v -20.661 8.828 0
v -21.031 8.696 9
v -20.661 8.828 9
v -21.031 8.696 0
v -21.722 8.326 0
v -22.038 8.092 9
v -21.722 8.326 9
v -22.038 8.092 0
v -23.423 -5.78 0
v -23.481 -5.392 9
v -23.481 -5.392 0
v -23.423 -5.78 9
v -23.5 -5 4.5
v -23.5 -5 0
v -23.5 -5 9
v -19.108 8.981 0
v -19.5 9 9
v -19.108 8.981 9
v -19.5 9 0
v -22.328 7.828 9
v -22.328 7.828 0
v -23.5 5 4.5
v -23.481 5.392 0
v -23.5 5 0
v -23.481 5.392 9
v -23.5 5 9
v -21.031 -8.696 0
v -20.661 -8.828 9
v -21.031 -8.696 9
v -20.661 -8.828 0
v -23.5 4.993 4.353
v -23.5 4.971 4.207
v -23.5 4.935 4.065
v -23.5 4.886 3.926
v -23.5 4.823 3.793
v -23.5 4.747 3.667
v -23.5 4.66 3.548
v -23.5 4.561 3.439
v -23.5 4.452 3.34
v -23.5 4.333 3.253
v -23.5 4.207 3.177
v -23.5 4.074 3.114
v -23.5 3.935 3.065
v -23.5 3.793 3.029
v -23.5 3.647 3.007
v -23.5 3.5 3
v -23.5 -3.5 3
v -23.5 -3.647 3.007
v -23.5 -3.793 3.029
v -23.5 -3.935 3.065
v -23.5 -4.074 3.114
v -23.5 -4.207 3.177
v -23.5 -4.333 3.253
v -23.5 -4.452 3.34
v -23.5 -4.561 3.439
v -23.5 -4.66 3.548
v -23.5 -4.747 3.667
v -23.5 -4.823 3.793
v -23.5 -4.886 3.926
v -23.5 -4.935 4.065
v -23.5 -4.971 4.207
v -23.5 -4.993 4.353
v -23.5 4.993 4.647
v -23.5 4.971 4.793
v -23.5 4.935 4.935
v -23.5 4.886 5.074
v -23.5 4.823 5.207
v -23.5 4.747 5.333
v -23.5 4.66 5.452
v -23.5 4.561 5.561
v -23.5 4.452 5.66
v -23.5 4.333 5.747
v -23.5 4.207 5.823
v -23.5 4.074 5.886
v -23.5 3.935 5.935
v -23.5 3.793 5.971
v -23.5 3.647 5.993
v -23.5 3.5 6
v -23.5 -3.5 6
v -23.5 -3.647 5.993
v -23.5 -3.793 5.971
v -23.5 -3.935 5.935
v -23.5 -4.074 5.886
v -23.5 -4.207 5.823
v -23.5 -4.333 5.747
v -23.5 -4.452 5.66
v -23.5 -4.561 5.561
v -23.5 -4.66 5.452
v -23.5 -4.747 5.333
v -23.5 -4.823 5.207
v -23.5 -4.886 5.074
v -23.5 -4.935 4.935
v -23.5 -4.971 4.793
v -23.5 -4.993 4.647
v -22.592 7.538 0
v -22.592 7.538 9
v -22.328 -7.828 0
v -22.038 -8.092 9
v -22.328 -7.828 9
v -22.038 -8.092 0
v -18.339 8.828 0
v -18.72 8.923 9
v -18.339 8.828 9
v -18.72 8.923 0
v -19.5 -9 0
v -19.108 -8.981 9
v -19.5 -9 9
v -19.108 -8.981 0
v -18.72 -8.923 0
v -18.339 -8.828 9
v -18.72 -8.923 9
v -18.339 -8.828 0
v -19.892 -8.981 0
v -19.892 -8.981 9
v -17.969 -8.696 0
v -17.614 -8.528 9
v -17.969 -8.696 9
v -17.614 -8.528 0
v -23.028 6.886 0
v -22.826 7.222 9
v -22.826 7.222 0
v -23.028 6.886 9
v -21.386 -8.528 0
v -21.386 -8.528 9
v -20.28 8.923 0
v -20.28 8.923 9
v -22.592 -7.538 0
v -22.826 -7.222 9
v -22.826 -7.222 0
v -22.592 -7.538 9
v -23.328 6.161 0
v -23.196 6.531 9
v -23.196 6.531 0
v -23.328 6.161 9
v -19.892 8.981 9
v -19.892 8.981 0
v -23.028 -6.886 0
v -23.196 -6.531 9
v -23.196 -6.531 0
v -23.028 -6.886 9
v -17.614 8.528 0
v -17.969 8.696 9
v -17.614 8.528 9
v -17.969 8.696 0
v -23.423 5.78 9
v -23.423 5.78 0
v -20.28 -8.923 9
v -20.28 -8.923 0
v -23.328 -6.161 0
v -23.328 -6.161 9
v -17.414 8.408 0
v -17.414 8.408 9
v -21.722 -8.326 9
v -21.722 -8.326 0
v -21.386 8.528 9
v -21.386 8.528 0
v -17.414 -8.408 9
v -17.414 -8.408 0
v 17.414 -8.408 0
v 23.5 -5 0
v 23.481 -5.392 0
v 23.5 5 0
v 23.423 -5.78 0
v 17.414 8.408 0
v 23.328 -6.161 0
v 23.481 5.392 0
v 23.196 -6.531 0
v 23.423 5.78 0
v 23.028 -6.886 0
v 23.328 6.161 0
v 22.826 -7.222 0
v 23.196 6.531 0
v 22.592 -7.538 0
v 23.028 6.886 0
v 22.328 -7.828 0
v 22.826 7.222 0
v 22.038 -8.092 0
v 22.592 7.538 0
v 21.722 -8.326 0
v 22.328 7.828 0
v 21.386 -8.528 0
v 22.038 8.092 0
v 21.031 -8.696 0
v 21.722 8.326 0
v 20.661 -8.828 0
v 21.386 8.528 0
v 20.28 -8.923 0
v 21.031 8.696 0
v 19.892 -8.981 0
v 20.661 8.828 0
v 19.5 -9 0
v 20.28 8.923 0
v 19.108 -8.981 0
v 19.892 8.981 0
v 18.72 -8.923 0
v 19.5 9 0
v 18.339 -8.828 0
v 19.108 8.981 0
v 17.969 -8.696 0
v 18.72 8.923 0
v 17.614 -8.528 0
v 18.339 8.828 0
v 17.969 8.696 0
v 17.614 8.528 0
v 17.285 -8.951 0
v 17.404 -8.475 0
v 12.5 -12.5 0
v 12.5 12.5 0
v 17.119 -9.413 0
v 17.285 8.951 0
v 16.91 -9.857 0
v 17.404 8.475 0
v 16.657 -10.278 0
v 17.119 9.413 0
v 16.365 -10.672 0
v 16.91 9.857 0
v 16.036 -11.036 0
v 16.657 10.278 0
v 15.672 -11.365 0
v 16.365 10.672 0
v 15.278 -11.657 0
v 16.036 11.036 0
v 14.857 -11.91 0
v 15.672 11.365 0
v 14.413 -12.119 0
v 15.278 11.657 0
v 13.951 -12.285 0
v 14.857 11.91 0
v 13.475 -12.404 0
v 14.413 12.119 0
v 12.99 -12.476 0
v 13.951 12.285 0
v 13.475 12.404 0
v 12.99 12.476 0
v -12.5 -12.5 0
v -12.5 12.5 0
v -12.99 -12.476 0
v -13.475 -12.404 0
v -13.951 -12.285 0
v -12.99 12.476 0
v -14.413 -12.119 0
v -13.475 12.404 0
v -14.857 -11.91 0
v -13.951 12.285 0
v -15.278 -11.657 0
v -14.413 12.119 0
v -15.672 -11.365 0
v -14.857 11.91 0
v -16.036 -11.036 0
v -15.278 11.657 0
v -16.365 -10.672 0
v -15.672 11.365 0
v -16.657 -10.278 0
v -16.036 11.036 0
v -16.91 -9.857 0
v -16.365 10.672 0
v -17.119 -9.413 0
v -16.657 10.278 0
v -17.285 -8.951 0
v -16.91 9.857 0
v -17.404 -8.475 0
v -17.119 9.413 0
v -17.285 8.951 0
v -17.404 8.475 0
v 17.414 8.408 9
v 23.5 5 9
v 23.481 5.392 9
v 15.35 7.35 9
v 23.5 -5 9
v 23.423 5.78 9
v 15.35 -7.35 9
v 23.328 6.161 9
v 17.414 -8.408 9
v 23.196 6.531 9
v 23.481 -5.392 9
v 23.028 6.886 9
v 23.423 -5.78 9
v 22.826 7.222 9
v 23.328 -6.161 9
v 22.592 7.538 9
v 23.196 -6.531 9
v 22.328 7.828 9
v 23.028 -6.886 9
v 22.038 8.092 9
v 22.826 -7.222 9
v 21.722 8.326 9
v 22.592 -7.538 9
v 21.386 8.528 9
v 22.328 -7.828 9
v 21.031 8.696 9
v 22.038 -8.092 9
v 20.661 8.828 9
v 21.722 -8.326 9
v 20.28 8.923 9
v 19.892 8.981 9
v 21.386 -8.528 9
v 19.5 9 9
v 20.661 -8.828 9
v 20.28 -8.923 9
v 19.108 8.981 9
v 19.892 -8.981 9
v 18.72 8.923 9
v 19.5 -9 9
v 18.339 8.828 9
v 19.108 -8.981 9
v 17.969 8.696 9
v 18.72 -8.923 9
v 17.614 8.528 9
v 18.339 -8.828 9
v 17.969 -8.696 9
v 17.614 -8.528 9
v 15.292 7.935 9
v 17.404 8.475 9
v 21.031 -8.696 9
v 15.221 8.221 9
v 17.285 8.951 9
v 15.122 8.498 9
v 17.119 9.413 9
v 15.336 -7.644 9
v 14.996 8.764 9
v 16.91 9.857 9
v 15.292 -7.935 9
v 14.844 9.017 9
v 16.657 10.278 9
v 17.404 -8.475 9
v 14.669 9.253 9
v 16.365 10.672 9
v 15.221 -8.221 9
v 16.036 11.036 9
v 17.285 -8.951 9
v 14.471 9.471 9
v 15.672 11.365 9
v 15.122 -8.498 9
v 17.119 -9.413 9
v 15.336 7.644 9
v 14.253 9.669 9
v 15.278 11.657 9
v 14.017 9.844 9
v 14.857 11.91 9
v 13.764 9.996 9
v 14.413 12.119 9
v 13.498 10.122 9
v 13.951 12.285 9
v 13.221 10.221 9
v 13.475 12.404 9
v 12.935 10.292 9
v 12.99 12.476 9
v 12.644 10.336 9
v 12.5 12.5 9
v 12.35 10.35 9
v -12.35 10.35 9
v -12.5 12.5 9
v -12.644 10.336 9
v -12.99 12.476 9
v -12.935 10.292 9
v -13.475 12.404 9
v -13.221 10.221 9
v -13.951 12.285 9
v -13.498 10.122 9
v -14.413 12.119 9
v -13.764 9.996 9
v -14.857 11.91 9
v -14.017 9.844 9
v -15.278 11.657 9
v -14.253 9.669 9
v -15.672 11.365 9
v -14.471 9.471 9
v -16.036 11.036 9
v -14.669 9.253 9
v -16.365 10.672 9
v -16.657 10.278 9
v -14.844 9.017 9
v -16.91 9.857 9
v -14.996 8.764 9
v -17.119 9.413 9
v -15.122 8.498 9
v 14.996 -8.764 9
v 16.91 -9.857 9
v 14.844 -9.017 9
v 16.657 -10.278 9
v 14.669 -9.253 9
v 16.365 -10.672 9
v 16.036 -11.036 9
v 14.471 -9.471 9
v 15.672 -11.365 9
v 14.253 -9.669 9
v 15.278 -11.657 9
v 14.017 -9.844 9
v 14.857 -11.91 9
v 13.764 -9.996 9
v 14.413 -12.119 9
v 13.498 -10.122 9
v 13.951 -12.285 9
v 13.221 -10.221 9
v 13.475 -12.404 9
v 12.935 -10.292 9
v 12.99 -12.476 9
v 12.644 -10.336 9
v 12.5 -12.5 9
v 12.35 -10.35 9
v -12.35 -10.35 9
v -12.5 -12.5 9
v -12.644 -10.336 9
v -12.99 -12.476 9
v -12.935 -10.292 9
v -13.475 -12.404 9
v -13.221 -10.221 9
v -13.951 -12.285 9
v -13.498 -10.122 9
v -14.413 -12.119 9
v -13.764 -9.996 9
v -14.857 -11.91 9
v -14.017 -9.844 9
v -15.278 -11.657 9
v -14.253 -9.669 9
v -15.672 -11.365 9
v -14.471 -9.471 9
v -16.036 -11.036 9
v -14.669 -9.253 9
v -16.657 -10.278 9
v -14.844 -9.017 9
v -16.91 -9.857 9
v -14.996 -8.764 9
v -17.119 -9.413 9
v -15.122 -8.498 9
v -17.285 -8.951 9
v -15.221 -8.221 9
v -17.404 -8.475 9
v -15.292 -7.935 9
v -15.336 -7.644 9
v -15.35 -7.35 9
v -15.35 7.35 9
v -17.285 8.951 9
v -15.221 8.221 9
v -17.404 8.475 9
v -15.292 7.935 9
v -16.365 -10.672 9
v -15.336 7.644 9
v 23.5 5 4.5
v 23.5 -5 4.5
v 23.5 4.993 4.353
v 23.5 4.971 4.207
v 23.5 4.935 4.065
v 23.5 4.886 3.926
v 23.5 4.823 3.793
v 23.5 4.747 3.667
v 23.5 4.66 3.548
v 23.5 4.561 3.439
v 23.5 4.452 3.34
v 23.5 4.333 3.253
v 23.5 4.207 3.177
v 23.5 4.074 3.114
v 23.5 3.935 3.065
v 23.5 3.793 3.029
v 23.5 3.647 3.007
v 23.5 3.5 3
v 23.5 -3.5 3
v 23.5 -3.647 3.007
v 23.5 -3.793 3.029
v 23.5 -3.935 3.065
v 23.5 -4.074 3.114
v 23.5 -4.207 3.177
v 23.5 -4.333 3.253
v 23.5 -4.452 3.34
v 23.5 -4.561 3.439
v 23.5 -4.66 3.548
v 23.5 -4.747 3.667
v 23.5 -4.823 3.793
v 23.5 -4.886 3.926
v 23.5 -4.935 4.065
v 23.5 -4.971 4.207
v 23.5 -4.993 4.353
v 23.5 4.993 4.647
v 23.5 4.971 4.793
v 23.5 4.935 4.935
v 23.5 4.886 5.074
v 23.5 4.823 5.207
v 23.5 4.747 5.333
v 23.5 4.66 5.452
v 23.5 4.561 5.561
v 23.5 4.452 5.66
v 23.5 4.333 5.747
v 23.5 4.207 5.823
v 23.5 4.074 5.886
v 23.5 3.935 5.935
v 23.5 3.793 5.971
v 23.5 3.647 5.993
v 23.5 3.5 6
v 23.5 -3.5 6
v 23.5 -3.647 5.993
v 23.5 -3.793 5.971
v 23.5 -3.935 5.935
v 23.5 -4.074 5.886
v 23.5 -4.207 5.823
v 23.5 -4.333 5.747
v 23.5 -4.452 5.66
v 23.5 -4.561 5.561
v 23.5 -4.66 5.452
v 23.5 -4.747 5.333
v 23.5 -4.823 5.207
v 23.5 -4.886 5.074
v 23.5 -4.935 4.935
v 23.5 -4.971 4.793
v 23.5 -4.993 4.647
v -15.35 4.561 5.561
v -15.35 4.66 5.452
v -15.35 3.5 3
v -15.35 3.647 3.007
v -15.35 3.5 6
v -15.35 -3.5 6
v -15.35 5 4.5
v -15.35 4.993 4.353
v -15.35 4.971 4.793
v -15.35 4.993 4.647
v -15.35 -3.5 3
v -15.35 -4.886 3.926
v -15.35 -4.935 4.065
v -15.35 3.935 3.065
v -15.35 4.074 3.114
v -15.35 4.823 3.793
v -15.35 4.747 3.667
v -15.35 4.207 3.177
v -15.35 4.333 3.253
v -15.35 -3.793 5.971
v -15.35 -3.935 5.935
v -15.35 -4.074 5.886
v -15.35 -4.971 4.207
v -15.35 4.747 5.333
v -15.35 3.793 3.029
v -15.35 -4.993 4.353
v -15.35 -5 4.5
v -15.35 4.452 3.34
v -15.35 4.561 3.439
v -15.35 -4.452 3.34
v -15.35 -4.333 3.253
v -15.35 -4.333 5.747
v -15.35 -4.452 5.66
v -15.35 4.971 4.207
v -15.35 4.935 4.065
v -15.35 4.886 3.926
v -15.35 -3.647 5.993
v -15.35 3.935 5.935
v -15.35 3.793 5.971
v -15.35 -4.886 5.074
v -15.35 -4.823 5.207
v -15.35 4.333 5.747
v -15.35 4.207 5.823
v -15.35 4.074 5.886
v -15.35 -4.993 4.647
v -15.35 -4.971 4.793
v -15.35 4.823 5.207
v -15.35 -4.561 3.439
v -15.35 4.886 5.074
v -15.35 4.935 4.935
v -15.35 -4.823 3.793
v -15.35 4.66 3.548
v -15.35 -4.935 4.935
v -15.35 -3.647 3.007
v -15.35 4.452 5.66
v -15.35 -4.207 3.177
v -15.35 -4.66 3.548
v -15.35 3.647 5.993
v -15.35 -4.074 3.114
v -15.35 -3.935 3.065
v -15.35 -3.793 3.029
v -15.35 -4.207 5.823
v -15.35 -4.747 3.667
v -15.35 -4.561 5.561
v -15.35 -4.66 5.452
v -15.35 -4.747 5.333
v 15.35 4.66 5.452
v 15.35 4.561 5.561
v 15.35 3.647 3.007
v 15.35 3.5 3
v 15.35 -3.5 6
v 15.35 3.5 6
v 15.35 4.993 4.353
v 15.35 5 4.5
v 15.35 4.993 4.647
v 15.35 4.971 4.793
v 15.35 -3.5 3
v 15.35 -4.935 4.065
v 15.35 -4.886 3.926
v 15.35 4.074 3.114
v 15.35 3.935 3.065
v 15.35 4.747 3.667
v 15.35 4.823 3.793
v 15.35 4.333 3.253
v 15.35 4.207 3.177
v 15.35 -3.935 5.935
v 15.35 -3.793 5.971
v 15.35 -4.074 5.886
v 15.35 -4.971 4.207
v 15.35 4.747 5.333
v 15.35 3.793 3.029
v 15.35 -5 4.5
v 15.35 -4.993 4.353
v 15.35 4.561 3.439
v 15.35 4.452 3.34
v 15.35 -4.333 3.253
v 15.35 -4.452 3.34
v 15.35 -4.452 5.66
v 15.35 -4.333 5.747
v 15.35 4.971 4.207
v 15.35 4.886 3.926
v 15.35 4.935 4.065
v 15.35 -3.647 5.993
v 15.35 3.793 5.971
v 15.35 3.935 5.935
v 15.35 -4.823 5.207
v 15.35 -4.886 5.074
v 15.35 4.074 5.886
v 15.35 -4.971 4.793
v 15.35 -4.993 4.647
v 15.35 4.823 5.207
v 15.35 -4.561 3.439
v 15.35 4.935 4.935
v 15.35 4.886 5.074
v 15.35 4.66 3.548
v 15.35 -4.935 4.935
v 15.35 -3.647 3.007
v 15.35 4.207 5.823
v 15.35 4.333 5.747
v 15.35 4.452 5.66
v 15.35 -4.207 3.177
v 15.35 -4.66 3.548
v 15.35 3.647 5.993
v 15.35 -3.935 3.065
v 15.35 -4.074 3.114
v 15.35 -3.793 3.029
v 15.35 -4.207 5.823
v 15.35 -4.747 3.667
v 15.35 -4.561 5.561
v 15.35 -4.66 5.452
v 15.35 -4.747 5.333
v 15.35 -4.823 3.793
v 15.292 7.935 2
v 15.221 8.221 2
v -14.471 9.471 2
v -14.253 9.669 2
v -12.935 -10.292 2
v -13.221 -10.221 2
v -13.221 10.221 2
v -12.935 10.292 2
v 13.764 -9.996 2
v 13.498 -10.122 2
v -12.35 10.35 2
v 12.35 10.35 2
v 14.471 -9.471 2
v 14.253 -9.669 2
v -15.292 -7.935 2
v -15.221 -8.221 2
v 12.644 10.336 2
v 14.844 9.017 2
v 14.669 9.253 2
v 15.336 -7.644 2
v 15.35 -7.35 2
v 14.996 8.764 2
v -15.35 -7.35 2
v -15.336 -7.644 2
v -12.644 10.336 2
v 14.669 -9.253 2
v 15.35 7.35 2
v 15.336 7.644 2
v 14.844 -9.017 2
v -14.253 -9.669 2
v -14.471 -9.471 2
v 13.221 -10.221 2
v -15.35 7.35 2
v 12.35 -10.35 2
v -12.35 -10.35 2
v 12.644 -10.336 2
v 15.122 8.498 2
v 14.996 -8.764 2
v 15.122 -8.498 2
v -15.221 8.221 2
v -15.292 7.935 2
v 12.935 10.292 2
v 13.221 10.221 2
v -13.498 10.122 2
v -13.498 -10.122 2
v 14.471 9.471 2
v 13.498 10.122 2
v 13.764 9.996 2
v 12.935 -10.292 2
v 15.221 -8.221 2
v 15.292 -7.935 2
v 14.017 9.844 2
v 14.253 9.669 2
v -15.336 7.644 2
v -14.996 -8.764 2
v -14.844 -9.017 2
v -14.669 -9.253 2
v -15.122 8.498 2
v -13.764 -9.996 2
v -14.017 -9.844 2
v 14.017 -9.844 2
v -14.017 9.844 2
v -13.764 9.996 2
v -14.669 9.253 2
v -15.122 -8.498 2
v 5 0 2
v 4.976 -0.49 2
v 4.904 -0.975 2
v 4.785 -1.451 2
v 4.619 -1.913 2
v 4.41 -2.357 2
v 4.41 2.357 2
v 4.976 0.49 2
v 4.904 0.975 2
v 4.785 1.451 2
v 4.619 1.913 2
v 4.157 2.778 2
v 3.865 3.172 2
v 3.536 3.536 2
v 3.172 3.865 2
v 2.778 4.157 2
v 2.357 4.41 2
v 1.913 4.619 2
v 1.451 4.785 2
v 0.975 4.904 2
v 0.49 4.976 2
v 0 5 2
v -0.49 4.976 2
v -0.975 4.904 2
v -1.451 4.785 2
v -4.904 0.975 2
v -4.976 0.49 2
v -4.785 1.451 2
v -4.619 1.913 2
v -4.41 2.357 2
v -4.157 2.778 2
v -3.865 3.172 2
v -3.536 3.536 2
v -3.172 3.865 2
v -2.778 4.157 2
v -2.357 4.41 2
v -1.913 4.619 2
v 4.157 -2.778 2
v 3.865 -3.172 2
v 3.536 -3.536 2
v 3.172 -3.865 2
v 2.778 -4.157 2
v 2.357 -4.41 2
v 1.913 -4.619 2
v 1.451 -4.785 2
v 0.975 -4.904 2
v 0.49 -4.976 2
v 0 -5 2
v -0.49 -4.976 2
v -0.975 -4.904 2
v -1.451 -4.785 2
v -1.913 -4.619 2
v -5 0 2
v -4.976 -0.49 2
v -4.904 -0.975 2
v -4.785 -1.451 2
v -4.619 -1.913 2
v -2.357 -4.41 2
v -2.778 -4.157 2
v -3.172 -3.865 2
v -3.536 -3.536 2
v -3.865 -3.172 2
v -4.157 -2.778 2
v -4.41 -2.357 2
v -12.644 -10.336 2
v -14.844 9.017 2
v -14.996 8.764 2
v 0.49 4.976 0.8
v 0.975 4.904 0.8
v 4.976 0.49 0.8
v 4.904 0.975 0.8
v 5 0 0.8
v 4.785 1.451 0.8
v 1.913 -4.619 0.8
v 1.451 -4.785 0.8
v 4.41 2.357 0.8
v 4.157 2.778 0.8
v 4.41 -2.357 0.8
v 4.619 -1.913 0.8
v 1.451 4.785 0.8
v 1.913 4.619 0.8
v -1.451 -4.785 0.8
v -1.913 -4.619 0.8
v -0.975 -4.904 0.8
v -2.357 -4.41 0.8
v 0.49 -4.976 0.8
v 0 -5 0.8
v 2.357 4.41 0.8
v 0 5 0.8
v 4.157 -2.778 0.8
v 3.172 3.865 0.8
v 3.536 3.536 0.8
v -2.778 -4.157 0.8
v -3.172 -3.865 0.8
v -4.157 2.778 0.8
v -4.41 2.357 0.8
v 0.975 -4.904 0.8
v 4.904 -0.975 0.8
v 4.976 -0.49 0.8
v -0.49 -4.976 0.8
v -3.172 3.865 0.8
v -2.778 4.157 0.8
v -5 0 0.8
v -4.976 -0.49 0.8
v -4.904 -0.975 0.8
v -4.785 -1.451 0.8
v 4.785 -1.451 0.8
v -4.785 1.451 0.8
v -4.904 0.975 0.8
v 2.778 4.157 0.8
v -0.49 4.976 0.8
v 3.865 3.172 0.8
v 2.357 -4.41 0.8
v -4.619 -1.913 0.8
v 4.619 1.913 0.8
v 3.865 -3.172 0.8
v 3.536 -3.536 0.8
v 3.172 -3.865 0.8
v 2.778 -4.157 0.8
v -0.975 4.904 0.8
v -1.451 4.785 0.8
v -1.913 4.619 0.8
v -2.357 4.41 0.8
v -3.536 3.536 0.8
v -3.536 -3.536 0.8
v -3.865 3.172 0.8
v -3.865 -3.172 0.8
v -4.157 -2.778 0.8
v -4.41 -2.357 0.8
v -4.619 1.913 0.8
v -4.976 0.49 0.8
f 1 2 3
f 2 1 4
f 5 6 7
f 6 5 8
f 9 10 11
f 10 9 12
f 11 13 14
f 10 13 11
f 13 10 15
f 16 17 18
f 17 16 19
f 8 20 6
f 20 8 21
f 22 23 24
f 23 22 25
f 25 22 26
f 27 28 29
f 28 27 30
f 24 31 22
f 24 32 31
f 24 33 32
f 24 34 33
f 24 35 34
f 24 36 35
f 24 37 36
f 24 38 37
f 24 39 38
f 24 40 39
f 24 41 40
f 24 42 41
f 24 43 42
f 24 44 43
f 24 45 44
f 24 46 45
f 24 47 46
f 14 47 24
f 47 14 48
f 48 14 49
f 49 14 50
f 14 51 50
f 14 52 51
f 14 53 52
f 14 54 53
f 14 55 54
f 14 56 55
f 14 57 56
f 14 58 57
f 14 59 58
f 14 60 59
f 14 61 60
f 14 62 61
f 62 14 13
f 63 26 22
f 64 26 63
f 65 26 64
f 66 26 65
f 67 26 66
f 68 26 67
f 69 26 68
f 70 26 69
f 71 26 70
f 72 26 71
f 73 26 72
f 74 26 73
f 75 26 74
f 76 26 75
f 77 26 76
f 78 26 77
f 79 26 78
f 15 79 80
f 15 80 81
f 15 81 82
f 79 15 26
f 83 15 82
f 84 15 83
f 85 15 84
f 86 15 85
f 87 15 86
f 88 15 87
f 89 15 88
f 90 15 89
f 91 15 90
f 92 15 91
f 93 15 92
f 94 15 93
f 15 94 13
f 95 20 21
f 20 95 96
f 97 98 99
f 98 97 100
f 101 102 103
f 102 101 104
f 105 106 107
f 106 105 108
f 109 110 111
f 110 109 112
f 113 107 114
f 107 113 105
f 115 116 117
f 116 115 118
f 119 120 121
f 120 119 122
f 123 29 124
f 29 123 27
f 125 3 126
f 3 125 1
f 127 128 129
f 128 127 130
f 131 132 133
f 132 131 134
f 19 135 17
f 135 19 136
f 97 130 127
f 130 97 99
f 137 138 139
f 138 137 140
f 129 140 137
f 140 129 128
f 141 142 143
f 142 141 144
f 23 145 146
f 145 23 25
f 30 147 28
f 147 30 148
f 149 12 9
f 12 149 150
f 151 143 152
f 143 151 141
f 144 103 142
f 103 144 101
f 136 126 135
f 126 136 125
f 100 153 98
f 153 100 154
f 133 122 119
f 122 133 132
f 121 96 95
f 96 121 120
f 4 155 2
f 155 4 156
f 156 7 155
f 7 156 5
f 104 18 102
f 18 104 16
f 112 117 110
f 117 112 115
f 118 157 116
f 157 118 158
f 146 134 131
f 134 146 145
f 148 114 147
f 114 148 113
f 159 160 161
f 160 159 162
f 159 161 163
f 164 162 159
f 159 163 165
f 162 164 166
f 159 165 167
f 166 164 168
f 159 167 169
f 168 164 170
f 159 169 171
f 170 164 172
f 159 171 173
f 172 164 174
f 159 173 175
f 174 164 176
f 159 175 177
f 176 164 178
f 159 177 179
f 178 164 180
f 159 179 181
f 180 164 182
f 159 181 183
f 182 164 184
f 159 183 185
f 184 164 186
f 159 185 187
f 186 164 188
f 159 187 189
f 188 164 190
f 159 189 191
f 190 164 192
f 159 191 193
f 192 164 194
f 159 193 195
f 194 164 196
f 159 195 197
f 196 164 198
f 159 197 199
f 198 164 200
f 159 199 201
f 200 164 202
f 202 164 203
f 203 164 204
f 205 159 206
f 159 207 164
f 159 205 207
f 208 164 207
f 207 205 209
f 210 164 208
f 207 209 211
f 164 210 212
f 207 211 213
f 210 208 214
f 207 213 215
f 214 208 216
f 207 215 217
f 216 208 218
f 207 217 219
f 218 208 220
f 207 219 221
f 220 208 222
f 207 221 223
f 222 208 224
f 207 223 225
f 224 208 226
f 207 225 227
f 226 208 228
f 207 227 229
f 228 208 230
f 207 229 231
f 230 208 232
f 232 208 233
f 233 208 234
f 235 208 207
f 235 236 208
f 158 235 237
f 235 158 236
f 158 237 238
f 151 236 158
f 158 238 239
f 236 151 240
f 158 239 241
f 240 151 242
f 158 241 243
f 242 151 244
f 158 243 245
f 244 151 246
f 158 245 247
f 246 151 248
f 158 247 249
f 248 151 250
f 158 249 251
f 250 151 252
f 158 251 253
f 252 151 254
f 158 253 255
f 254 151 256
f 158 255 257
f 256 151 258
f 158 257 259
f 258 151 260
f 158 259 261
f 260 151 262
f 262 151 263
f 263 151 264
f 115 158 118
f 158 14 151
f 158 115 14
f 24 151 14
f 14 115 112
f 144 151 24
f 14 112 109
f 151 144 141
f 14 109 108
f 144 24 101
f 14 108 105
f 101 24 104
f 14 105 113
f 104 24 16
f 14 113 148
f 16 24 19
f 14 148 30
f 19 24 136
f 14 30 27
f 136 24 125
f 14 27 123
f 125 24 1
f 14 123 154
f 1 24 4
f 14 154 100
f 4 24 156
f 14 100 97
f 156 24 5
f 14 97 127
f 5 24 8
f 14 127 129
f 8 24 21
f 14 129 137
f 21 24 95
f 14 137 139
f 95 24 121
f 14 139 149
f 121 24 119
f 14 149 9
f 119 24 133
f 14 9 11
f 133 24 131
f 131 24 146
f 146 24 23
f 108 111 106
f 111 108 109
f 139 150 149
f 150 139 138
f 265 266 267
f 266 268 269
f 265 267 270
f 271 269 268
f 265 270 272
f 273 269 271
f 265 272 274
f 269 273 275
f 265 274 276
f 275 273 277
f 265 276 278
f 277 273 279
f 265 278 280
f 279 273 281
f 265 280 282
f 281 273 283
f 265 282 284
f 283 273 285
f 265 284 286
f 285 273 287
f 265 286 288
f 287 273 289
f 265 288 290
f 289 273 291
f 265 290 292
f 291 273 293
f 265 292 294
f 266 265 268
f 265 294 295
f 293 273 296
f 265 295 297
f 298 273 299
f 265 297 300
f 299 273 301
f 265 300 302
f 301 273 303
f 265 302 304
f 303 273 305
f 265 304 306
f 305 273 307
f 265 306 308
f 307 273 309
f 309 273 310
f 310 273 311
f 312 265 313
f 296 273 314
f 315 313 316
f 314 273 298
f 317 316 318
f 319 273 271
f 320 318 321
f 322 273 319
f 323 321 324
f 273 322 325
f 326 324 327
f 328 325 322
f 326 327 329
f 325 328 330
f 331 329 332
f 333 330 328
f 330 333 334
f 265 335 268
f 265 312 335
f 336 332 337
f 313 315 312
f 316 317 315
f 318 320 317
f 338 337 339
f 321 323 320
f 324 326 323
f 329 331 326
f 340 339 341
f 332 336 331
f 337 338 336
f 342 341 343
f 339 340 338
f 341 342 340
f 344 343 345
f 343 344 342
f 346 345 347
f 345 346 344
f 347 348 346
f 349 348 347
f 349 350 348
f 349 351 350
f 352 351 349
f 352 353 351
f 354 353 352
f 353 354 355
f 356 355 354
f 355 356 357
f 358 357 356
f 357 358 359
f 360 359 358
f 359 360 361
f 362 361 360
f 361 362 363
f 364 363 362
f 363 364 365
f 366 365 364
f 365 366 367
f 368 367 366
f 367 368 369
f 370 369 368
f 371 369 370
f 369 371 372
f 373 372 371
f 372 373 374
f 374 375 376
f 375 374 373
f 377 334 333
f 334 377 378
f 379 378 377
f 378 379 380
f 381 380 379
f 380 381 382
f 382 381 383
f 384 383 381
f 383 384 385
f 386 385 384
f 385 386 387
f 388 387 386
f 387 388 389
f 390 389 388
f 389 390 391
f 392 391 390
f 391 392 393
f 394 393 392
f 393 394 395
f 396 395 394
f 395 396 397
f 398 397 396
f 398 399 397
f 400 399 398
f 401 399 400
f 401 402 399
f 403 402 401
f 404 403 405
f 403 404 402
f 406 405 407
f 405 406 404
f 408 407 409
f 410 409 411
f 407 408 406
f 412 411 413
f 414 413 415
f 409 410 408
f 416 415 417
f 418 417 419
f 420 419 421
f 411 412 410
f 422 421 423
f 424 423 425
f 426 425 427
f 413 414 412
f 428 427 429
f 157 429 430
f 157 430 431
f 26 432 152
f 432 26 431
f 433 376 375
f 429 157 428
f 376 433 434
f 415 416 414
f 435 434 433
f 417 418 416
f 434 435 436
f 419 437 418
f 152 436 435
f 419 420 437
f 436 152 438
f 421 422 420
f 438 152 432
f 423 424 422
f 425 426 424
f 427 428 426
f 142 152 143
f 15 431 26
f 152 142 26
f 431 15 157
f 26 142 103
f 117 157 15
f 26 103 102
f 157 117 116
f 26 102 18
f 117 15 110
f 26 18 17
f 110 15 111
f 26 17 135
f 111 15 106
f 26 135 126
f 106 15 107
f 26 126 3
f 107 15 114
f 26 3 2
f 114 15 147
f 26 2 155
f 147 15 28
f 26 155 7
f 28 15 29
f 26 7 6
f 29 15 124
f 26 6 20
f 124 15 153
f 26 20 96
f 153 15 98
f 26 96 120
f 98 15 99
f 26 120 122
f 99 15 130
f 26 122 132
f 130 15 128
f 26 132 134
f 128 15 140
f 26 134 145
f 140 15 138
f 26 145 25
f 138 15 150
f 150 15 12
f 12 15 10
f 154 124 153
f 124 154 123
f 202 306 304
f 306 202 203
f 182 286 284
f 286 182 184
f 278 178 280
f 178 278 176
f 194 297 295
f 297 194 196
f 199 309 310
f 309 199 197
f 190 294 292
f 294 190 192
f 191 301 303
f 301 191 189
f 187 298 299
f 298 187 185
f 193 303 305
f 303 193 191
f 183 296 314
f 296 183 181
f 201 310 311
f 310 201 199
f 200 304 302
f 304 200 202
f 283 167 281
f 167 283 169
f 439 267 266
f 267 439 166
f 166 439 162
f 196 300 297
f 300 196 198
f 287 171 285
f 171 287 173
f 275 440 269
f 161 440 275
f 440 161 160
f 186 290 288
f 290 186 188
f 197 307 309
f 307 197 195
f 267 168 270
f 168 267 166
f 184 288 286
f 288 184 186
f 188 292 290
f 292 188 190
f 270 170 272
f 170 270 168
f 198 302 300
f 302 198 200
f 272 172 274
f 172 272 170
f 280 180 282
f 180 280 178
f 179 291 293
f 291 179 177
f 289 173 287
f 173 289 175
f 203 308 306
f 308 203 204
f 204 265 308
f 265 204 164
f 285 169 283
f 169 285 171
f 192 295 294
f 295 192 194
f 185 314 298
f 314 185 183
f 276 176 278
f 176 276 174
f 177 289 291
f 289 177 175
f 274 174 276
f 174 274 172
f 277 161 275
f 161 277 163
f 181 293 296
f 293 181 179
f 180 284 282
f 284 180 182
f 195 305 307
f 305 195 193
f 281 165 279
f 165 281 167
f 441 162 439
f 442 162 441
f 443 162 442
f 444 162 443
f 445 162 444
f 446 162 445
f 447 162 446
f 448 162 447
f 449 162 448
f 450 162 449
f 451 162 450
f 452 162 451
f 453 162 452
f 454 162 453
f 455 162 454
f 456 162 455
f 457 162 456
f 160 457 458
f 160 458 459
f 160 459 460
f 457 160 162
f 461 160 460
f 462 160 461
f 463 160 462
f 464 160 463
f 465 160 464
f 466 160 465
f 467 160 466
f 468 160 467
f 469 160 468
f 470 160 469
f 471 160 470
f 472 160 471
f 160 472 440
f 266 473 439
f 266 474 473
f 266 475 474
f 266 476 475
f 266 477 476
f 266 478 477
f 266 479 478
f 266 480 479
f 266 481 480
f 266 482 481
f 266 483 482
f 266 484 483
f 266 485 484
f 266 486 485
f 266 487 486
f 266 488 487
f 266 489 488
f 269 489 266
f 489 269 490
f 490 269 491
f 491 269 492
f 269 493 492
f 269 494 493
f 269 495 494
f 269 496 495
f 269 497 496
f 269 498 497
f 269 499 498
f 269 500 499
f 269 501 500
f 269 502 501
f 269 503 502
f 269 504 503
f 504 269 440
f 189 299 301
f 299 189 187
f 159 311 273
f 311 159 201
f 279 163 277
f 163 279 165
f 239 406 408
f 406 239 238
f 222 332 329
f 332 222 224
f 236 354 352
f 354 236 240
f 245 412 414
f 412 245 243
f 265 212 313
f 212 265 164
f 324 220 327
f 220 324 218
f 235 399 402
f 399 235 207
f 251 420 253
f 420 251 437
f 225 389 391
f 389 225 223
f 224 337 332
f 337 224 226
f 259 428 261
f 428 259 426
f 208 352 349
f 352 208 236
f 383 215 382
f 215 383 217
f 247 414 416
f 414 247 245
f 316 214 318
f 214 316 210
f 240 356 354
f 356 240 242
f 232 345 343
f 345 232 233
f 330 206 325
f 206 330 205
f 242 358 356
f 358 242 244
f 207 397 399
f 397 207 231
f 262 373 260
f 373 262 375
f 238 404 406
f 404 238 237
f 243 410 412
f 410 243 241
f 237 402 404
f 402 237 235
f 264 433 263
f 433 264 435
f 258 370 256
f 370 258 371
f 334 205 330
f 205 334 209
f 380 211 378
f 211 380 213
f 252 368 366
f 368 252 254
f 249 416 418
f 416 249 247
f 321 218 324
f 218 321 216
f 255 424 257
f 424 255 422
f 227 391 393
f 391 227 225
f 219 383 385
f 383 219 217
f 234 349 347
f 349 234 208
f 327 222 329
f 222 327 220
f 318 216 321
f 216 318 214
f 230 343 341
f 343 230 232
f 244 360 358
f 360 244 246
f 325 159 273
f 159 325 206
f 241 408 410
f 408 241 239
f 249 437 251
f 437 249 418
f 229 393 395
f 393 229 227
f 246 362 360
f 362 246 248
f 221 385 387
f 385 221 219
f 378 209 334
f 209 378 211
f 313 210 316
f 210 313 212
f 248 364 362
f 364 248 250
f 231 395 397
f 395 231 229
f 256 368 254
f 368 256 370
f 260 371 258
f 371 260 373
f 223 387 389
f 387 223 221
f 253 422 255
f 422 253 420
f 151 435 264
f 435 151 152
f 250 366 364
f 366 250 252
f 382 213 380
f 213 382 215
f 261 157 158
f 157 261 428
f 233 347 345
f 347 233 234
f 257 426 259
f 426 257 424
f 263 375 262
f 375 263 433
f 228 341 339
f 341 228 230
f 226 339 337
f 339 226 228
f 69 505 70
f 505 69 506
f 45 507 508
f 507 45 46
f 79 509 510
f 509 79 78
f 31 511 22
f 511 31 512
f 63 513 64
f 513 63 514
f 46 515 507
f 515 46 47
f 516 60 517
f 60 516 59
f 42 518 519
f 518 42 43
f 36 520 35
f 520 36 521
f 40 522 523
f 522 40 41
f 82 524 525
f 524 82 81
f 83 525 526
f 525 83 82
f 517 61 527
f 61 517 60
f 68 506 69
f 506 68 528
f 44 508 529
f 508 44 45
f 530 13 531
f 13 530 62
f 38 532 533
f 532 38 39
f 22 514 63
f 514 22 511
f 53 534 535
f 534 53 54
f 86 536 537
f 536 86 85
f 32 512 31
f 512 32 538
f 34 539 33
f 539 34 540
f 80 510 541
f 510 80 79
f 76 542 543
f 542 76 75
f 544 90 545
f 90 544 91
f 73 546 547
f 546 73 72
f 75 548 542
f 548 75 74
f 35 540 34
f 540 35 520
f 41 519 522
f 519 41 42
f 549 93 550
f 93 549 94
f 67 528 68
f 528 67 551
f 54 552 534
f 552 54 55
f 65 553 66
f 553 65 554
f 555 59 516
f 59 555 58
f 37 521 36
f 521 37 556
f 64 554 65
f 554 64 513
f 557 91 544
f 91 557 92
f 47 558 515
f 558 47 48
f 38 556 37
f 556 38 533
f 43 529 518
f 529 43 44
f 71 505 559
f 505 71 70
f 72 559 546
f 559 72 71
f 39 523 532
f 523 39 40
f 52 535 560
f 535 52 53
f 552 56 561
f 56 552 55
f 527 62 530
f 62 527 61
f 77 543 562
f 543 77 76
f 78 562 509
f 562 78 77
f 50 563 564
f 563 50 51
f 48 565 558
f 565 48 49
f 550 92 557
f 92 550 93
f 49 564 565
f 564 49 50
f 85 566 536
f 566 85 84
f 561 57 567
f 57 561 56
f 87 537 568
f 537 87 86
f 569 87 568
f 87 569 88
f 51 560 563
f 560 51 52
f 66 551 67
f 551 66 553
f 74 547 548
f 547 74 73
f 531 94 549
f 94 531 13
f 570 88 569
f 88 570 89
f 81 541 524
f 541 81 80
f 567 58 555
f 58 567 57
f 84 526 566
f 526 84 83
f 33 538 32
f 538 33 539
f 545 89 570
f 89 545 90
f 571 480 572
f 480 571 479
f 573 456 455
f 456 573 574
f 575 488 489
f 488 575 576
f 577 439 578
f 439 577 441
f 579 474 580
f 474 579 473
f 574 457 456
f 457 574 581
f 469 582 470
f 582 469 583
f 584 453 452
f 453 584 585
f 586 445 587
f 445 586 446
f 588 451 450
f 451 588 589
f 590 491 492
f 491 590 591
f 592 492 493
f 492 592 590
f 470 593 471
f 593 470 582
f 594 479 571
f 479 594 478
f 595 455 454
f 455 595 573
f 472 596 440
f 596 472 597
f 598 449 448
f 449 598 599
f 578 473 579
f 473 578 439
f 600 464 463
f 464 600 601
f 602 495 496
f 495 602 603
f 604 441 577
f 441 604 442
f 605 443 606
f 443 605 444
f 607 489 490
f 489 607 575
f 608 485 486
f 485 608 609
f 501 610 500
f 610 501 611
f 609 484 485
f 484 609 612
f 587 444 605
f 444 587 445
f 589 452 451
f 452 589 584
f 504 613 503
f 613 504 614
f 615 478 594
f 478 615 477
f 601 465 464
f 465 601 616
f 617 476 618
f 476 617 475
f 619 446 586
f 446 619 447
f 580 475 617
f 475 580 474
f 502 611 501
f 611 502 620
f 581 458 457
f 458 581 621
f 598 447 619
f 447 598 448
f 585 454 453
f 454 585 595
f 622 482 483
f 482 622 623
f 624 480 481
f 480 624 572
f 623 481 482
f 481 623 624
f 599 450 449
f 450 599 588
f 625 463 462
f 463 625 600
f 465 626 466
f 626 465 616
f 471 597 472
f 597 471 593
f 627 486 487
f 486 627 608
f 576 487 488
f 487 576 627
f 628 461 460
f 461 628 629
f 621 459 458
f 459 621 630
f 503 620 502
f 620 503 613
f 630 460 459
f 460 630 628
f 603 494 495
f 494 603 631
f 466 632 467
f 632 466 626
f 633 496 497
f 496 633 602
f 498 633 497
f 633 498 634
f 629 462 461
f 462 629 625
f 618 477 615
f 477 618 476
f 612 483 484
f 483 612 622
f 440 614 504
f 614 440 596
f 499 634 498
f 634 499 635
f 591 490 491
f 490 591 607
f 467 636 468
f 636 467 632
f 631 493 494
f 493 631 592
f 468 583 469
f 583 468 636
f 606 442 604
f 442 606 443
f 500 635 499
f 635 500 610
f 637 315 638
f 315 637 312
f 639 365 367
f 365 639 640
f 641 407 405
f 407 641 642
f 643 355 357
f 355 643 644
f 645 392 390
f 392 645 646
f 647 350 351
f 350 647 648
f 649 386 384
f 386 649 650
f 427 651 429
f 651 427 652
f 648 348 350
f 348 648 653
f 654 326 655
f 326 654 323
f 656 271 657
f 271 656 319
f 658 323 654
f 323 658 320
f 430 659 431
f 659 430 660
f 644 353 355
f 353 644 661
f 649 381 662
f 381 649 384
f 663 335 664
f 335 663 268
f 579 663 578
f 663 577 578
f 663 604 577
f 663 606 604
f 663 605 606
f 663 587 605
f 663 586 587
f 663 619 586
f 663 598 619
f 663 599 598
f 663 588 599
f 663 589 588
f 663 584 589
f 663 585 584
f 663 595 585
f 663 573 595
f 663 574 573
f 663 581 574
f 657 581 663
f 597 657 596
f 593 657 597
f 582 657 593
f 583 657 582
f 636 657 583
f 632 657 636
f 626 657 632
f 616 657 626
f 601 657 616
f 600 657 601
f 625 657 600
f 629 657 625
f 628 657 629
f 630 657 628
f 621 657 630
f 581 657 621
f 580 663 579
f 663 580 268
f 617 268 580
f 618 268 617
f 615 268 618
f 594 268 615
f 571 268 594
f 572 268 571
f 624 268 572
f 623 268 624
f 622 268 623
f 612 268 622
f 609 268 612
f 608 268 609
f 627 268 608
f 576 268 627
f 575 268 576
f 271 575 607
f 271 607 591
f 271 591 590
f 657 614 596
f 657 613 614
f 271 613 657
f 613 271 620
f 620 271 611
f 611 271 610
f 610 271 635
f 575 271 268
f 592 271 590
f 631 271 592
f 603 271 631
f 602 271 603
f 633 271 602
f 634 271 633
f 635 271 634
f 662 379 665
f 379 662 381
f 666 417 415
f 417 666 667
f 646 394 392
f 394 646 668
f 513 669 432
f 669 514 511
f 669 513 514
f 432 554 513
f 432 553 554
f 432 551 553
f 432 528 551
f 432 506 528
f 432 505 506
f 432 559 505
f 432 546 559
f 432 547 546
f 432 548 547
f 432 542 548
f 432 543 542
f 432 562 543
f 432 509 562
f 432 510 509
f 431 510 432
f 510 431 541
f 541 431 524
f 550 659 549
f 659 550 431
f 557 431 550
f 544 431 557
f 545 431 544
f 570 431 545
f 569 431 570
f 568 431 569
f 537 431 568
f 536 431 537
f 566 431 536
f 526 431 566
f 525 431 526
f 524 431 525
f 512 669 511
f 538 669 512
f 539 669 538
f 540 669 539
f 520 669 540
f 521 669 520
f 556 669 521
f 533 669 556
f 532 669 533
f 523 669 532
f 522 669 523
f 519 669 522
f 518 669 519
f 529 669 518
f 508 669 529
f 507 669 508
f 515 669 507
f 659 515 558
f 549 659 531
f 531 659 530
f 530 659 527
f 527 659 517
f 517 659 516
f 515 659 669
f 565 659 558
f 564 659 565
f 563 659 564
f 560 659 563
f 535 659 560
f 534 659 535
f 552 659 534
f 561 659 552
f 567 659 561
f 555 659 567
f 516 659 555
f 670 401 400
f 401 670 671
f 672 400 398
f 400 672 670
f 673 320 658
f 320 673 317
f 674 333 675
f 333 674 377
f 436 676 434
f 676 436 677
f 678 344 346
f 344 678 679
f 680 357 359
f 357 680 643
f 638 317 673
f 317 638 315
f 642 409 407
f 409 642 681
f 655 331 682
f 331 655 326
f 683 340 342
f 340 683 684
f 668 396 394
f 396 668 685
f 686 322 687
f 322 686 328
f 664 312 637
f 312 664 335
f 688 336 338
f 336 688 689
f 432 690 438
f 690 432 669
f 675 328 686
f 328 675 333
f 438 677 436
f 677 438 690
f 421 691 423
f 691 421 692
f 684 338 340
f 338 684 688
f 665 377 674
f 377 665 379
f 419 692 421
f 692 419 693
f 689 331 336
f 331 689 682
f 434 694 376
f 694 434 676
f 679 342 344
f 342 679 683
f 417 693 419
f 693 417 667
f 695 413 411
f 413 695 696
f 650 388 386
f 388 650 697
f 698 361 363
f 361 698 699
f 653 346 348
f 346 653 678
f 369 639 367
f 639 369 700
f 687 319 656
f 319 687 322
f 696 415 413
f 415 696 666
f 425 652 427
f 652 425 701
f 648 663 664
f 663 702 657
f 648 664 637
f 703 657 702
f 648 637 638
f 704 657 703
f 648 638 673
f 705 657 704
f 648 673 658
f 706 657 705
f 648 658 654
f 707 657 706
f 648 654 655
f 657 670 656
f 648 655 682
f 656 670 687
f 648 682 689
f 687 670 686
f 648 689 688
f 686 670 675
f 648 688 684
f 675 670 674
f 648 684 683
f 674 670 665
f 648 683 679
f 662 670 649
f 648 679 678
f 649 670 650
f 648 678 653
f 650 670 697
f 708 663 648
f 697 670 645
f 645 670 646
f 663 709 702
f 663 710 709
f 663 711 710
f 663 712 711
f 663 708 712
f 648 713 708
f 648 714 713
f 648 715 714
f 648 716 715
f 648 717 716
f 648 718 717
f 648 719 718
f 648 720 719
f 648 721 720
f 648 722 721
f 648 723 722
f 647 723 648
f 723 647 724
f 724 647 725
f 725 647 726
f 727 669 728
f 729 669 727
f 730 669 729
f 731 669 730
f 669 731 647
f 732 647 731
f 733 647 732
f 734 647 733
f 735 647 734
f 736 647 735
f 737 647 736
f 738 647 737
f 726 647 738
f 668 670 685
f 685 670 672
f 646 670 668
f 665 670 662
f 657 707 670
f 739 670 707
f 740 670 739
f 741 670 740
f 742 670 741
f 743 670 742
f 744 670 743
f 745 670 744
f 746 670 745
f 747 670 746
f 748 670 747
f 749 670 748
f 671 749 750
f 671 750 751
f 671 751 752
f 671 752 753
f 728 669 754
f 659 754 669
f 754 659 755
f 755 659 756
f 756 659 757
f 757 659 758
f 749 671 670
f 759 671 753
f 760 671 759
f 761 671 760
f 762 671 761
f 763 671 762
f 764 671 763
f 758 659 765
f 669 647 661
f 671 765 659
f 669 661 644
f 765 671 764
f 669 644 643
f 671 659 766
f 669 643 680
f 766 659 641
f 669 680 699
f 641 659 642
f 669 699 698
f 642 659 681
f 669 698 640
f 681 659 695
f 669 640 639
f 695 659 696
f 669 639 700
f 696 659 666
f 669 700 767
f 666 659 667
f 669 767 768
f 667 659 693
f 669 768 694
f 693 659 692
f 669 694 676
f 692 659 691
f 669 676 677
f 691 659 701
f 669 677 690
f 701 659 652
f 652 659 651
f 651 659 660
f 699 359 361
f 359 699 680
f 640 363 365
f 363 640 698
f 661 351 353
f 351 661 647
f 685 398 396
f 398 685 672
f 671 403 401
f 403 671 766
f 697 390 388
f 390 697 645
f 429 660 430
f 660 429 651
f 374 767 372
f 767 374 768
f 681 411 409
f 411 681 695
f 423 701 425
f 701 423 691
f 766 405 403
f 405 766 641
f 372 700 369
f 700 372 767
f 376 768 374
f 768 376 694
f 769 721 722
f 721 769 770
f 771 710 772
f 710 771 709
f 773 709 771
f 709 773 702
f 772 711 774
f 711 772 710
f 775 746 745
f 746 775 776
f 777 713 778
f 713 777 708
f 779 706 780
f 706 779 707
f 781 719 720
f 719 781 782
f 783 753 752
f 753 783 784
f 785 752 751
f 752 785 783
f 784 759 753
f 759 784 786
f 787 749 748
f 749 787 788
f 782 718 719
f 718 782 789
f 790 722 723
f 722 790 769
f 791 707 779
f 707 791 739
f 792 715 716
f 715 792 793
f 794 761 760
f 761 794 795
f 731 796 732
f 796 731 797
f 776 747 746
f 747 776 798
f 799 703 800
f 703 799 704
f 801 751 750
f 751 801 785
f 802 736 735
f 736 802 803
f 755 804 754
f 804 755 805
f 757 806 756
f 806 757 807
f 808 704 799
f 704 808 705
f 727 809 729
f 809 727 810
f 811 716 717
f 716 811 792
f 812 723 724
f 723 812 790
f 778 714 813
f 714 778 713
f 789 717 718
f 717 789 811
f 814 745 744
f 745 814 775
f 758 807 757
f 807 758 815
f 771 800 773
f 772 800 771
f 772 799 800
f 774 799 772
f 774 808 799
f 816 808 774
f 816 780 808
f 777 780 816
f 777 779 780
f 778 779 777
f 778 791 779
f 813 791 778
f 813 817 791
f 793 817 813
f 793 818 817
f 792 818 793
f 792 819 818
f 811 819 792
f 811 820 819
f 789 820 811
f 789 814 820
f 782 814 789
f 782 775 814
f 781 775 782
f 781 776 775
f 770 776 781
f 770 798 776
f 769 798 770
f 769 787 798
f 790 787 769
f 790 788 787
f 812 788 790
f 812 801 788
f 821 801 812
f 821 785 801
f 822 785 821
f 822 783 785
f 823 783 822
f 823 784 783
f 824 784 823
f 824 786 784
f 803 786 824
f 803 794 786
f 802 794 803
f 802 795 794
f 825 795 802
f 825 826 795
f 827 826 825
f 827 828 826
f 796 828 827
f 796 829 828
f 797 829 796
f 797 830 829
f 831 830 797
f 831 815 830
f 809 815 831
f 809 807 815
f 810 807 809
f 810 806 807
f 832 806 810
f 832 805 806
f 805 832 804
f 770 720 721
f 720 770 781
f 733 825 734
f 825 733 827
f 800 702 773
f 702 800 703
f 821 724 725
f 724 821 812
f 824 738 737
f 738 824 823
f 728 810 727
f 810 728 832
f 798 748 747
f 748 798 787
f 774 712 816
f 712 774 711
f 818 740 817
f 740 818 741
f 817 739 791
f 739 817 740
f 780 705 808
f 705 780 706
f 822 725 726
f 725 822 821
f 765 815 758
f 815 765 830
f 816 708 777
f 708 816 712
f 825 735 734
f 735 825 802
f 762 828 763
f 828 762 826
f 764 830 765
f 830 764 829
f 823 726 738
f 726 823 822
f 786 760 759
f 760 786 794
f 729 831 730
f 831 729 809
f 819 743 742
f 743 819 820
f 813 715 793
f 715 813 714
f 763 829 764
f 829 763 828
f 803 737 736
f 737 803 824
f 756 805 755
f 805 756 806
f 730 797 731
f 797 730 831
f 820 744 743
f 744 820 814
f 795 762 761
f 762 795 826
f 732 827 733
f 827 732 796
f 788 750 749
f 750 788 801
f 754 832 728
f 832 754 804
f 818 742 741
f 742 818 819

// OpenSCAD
/*
  SonhoBand case v0.1
  Modelo parametrico inicial em OpenSCAD.

  Unidades: milimetros.
  Orientacao:
  - X = comprimento do corpo
  - Y = largura do corpo
  - Z = altura do corpo
*/

$fn = 64;

// -----------------------------
// Parametros principais
// -----------------------------

body_length = 35;
body_width = 25;
body_height = 9;

wall = 2;
corner_radius = 5;

// Area inferior fina para contato do sensor termico.
sensor_diameter = 10;
sensor_floor_thickness = 0.8;

// Hastes laterais e passagem do elastico.
lug_length = 8;
lug_width = 18;
lug_overlap = 2;
lug_corner_radius = 4;

elastic_slot_width = 10;
elastic_slot_height = 3;
elastic_slot_z = body_height / 2;

// Folgas e raios internos.
cavity_clearance = 0.3;
cavity_corner_radius = max(corner_radius - wall, 1);

// -----------------------------
// Modelo final
// -----------------------------

sonhoband_case();

// -----------------------------
// Modulos principais
// -----------------------------

module sonhoband_case() {
    difference() {
        union() {
            main_body();
            side_lugs();
        }

        internal_cavity();
        sensor_thin_area();
        elastic_slots();
    }
}

module main_body() {
    rounded_box_xy(
        [body_length, body_width, body_height],
        corner_radius
    );
}

module side_lugs() {
    for (side = [-1, 1]) {
        translate([
            side * (body_length / 2 + lug_length / 2 - lug_overlap),
            0,
            0
        ]) {
            rounded_box_xy(
                [lug_length, lug_width, body_height],
                lug_corner_radius
            );
        }
    }
}

module internal_cavity() {
    // Cavidade aberta pela parte superior, deixando parede e fundo geral.
    translate([0, 0, wall]) {
        rounded_box_xy(
            [
                body_length - 2 * wall - cavity_clearance,
                body_width - 2 * wall - cavity_clearance,
                body_height + 1
            ],
            cavity_corner_radius
        );
    }
}

module sensor_thin_area() {
    // Rebaixo interno circular que deixa apenas 0,8 mm de material no fundo.
    translate([0, 0, sensor_floor_thickness]) {
        cylinder(
            h = body_height + 2,
            d = sensor_diameter,
            center = false
        );
    }
}

module elastic_slots() {
    for (side = [-1, 1]) {
        translate([
            side * (body_length / 2 + lug_length / 2 - lug_overlap),
            0,
            elastic_slot_z
        ]) {
            elastic_slot_cut(lug_length + 3);
        }
    }
}

// -----------------------------
// Modulos utilitarios
// -----------------------------

module rounded_box_xy(size, radius) {
    // Caixa com cantos arredondados no plano XY e laterais verticais.
    safe_radius = min(radius, min(size[0], size[1]) / 2);

    hull() {
        for (x = [-size[0] / 2 + safe_radius, size[0] / 2 - safe_radius]) {
            for (y = [-size[1] / 2 + safe_radius, size[1] / 2 - safe_radius]) {
                translate([x, y, 0]) {
                    cylinder(
                        h = size[2],
                        r = safe_radius,
                        center = false
                    );
                }
            }
        }
    }
}

module elastic_slot_cut(length) {
    // Fenda em formato capsula, atravessando cada haste lateral no eixo X.
    slot_radius = elastic_slot_height / 2;

    hull() {
        for (y = [
            -elastic_slot_width / 2 + slot_radius,
            elastic_slot_width / 2 - slot_radius
        ]) {
            translate([0, y, 0]) {
                rotate([0, 90, 0]) {
                    cylinder(
                        h = length,
                        r = slot_radius,
                        center = true
                    );
                }
            }
        }
    }
}
